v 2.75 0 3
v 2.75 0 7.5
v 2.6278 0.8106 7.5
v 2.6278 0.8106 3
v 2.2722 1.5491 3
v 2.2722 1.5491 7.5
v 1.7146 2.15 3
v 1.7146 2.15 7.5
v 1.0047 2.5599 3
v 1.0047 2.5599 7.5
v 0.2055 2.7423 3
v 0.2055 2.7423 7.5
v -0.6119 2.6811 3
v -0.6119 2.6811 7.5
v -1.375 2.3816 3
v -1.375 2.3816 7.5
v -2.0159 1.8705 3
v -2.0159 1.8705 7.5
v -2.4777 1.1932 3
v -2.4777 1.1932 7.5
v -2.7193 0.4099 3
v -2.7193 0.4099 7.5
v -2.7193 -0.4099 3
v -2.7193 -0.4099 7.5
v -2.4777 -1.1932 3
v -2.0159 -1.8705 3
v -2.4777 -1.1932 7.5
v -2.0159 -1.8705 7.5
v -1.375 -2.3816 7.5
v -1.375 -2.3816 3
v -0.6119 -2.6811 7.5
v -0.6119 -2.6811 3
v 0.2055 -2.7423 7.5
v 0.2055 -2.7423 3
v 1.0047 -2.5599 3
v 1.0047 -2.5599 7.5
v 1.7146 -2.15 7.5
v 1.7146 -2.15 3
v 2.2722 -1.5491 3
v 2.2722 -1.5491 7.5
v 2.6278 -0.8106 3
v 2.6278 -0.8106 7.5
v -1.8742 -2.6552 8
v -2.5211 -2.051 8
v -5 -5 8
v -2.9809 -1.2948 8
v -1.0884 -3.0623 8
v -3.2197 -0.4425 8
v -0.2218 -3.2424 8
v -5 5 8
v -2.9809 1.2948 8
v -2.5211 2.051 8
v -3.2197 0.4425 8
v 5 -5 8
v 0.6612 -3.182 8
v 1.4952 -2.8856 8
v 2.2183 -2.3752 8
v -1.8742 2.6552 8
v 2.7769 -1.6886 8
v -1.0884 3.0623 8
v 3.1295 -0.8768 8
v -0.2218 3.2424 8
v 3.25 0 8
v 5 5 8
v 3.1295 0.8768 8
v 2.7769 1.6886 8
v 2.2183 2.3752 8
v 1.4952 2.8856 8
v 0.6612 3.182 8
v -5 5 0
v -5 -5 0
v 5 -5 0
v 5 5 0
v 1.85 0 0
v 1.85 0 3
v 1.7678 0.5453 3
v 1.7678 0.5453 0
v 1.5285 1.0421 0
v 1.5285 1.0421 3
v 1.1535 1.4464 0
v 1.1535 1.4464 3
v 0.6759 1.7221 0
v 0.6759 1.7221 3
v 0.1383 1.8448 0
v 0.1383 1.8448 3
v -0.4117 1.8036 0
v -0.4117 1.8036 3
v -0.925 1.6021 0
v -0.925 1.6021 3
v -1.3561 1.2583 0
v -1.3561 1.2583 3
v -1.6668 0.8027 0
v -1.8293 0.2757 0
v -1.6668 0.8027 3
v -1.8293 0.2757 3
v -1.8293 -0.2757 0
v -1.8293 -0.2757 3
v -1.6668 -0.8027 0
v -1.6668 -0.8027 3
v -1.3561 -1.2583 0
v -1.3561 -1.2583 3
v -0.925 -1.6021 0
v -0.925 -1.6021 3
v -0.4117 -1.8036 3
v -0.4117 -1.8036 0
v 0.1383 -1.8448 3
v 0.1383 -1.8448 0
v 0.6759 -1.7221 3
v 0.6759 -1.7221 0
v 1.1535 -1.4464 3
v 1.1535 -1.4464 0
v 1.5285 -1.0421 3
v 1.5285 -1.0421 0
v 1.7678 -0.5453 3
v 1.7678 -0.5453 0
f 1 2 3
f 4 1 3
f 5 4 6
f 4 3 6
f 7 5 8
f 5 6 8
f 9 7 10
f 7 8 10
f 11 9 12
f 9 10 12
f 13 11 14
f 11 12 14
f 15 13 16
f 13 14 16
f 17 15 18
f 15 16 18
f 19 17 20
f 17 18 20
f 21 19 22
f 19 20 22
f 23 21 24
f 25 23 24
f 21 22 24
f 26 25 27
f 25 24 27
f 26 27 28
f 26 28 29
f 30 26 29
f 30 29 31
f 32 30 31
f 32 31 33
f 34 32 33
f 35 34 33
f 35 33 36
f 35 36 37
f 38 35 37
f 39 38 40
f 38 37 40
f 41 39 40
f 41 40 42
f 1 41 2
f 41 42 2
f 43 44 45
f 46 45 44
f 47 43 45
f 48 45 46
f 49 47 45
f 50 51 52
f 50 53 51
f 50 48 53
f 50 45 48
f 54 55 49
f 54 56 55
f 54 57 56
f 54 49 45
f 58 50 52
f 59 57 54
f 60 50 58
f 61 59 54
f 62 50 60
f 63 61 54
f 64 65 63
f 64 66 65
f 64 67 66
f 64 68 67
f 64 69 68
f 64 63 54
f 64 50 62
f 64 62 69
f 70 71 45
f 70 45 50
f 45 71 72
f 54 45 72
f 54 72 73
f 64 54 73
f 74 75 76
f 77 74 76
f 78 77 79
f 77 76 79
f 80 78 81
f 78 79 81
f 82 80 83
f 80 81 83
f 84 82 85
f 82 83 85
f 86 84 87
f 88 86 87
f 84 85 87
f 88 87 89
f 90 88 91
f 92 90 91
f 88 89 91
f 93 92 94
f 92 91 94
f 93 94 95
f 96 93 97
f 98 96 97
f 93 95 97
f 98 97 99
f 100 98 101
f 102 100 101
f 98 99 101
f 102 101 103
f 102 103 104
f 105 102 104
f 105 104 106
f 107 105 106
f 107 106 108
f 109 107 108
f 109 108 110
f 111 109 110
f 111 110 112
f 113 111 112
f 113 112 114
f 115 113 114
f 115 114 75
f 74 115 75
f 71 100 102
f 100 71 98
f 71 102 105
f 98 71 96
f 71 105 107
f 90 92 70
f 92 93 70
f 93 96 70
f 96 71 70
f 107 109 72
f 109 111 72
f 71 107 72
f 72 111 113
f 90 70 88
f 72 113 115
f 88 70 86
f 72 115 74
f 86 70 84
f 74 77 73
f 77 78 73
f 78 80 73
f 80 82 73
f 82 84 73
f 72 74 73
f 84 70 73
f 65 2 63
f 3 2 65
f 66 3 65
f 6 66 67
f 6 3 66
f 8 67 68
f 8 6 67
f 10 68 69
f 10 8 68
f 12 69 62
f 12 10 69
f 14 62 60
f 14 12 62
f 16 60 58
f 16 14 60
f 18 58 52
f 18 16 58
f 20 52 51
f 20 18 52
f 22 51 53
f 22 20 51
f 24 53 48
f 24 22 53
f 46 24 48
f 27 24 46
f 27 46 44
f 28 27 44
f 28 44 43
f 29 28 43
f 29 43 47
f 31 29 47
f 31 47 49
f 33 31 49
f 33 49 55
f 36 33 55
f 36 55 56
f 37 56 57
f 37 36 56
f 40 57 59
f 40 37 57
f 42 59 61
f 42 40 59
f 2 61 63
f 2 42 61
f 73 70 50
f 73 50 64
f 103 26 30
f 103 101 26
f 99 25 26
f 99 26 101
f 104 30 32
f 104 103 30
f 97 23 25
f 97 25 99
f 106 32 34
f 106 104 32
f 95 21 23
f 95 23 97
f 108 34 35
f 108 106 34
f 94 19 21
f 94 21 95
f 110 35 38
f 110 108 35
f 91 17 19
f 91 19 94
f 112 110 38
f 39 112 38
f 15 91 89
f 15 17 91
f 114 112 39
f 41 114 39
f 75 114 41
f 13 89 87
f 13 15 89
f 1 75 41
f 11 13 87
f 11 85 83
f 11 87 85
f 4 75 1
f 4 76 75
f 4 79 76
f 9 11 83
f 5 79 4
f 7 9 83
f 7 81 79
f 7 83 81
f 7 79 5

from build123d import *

# Parameters (mm, degrees)
SKETCH_W        = 10
SKETCH_H        = 10
PAD_DEPTH       = 8
SKETCH001_R     = 1.85
POCKET_DEPTH    = 8
SKETCH002_R     = 2.75
POCKET001_DEPTH = 5
CHAMFER_SIZE    = 0.5


with BuildPart() as part:
    # Sketch → Pad (new body)
    with BuildSketch(Plane.XY):
        Rectangle(SKETCH_W, SKETCH_H)
    extrude(amount=PAD_DEPTH)

    # Sketch001 (on Face6 of Pad) → Pocket (cut)
    with BuildSketch(Plane.XY.offset(8)):
        Circle(SKETCH001_R)
    extrude(amount=-POCKET_DEPTH, mode=Mode.SUBTRACT)

    # Sketch002 (on Face5 of Pocket) → Pocket001 (cut)
    with BuildSketch(Plane.XY.offset(8)):
        Circle(SKETCH002_R)
    extrude(amount=-POCKET001_DEPTH, mode=Mode.SUBTRACT)

    # Chamfer
    chamfer_edges = [part.edges().sort_by_distance(p)[0] for p in [
        (-2.75, 0, 8),
    ]]
    chamfer(chamfer_edges, length=CHAMFER_SIZE)


solid = part.part
